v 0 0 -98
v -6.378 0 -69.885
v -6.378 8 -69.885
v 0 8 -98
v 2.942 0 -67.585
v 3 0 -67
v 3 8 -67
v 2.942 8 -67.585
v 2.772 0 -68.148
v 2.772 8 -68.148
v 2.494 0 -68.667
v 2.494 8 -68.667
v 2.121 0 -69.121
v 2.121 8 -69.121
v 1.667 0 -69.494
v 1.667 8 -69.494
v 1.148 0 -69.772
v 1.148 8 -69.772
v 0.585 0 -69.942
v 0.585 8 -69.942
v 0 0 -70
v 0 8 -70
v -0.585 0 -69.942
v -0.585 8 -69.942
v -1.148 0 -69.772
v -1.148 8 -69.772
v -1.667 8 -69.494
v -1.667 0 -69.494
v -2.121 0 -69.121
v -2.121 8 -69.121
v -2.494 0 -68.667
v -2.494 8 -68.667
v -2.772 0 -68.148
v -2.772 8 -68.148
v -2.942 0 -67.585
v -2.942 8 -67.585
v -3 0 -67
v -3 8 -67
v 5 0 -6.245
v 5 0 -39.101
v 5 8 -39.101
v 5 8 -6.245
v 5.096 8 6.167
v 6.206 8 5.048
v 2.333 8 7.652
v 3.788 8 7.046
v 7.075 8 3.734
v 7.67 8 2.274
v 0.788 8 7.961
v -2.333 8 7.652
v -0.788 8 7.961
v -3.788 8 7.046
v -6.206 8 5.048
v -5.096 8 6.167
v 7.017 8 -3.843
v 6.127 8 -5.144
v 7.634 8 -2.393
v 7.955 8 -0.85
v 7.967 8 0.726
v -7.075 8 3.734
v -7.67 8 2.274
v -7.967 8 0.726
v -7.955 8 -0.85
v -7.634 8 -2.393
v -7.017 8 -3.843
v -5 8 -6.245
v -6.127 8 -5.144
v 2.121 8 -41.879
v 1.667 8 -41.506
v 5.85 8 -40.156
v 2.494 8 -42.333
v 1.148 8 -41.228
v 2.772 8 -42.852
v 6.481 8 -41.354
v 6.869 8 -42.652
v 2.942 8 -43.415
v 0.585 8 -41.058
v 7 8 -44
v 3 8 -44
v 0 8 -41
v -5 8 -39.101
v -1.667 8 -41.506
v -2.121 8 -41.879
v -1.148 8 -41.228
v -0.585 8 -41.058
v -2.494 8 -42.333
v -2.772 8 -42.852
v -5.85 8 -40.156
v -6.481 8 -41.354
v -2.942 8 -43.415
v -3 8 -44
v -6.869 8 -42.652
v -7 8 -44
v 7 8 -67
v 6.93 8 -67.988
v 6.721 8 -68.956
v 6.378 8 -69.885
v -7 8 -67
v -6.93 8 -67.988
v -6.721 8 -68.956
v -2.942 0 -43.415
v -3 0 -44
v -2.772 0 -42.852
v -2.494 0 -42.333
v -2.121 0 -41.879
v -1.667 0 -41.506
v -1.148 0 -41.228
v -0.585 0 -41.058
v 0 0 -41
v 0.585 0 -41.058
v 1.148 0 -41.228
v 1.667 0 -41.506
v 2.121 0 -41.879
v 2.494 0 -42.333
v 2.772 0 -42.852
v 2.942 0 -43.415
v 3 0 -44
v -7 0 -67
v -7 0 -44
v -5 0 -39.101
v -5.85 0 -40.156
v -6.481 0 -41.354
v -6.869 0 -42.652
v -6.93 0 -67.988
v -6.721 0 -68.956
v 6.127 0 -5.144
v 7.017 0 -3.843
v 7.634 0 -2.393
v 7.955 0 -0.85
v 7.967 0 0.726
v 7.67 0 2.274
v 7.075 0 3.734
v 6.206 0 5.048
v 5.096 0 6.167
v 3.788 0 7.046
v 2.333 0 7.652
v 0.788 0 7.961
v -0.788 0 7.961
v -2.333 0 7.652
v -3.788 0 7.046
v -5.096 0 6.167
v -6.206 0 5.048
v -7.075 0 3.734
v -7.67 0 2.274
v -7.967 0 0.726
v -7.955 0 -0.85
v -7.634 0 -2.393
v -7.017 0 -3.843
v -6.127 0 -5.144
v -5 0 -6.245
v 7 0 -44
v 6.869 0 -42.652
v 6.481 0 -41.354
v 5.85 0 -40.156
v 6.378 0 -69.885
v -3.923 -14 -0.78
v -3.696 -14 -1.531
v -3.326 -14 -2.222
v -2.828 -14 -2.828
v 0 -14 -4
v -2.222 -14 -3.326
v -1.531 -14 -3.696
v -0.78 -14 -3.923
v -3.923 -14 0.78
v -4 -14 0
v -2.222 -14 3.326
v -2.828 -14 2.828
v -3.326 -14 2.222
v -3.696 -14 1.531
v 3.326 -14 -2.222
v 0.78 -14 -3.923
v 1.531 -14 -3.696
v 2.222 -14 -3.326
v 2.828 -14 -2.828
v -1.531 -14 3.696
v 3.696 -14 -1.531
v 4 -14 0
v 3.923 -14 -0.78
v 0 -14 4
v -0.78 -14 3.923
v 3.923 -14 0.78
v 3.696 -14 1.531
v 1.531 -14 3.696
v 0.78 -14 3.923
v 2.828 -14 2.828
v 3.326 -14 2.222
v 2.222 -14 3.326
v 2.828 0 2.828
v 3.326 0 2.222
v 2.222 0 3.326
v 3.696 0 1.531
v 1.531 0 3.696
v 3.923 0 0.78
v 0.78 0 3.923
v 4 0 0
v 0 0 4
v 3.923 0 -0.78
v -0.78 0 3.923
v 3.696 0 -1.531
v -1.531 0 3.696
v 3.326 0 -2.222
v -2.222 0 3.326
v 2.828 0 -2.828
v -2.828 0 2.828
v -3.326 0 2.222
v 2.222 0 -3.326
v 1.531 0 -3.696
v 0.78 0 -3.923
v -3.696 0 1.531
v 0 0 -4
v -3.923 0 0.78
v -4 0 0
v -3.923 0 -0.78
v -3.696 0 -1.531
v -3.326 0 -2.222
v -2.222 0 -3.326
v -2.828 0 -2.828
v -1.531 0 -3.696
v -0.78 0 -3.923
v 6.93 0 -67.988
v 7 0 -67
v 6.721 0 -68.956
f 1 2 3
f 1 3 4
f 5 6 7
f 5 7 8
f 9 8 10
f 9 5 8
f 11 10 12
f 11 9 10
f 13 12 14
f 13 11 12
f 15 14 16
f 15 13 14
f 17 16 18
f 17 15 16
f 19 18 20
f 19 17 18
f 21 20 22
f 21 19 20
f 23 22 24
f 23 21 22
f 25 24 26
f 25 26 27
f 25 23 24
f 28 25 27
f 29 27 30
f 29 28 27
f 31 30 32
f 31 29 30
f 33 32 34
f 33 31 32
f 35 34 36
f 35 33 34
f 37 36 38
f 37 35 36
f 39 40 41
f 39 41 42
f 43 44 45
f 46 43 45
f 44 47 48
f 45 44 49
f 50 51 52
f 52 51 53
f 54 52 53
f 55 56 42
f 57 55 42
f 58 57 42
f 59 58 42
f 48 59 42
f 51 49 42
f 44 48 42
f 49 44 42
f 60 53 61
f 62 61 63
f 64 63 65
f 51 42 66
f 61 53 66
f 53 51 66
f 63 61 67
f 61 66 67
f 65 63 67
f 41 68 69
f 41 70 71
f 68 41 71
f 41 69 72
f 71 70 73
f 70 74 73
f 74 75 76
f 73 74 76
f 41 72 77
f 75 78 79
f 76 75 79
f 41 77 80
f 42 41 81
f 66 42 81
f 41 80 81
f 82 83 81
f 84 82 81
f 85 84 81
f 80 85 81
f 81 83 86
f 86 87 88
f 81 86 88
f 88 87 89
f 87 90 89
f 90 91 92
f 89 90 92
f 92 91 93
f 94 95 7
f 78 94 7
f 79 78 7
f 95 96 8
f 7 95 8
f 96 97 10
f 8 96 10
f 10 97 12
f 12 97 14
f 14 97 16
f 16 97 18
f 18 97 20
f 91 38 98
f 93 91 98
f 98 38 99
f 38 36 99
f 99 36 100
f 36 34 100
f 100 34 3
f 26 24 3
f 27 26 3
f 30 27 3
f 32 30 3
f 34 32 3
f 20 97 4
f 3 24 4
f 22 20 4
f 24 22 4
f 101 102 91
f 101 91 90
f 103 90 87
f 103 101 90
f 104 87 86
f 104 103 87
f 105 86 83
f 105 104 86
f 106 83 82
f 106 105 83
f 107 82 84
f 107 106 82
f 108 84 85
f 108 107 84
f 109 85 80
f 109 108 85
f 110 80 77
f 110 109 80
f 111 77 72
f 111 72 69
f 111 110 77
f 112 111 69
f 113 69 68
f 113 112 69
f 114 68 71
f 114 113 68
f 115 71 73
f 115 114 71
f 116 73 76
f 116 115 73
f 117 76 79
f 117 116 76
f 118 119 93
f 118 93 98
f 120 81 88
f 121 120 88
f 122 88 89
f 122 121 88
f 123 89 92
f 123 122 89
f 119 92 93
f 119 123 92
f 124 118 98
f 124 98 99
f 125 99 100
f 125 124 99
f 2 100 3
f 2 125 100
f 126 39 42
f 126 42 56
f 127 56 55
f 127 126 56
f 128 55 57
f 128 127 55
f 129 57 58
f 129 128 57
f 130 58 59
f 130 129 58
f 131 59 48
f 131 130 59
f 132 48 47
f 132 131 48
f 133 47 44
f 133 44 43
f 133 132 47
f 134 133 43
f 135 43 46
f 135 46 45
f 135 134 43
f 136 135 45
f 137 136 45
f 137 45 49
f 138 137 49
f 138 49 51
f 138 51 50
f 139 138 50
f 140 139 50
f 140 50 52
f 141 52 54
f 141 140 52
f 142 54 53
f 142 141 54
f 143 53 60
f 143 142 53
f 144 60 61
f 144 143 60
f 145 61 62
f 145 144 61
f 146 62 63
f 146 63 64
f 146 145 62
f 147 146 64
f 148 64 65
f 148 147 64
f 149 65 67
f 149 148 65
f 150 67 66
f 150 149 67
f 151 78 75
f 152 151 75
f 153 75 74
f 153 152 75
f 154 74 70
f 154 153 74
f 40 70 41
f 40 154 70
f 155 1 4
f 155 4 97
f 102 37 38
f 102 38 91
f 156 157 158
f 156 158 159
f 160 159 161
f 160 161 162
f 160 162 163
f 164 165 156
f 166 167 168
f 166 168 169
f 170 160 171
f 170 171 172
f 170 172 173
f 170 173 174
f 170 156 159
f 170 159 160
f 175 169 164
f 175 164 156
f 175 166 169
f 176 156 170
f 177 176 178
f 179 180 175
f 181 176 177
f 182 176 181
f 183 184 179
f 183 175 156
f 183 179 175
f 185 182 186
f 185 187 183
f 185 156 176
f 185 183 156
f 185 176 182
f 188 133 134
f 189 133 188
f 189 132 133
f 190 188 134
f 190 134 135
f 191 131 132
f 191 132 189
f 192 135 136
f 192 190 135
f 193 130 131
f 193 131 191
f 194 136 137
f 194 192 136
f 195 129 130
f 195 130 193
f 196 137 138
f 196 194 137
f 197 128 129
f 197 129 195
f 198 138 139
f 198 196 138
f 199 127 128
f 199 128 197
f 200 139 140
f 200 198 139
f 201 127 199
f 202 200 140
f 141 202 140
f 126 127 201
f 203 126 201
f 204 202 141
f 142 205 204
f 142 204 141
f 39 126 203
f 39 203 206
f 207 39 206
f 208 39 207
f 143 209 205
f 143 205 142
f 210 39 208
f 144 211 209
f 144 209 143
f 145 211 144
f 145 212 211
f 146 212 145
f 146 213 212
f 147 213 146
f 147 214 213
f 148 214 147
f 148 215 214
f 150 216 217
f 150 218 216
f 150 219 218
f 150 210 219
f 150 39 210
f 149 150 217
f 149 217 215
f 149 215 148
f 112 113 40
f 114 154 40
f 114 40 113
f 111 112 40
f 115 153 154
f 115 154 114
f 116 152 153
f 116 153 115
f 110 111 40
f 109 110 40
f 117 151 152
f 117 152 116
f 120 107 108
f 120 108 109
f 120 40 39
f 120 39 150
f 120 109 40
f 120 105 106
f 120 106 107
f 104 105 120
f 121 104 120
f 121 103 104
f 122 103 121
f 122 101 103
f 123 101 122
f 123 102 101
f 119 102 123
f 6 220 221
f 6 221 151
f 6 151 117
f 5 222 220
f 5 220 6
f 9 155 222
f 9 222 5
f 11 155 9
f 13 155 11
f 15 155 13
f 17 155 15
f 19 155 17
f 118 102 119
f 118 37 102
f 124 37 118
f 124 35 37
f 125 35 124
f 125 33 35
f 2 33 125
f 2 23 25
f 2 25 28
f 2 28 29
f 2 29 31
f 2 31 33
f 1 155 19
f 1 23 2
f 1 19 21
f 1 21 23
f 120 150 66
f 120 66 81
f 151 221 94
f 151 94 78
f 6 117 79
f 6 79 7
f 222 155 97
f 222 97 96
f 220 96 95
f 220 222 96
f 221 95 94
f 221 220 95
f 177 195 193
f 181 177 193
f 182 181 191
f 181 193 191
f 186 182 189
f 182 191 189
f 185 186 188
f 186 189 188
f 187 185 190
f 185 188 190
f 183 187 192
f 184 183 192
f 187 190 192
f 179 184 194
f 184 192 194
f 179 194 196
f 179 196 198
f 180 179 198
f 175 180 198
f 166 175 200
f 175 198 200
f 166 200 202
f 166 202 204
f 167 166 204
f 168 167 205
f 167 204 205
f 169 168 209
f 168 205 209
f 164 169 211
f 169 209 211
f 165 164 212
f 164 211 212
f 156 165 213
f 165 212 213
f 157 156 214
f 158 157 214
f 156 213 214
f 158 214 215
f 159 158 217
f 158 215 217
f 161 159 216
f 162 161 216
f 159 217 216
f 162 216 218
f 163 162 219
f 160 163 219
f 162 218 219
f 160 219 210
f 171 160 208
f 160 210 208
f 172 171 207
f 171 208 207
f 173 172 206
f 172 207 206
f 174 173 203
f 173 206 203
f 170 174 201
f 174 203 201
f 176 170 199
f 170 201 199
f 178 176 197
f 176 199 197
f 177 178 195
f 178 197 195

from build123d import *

# Parameters (mm, degrees)
BOSS_EXTRUDE1_DEPTH = 8
SKETCH3_R           = 4
BOSS_EXTRUDE2_DEPTH = 14


with BuildPart() as part:
    # Sketch2 → Boss-Extrude1 (new body)
    with BuildSketch(Plane(origin=(0, 0, 0), x_dir=(1, 0, 0), z_dir=(0, 1, 0))):
        with BuildLine():
            Line((-5, 6.244997998), (-5, 39.101020514))
            ThreePointArc((-5, 39.101020514), (-6.480740698, 41.354248689), (-7, 44))
            Line((-7, 44), (-7, 67))
            ThreePointArc((-7, 67), (-6.84274311, 68.475420866), (-6.378038076, 69.884550276))
            Line((-6.378038076, 69.884550276), (0, 98))
            Line((0, 98), (6.378038076, 69.884550276))
            ThreePointArc((6.378038076, 69.884550276), (6.84274311, 68.475420866), (7, 67))
            Line((7, 67), (7, 44))
            ThreePointArc((7, 44), (6.480740698, 41.354248689), (5, 39.101020514))
            Line((5, 39.101020514), (5, 6.244997998))
            ThreePointArc((5, 6.244997998), (0, -8), (-5, 6.244997998))
        make_face()
        with BuildLine():
            Line((-3, 67), (-3, 44))
            ThreePointArc((-3, 44), (0, 41), (3, 44))
            Line((3, 44), (3, 67))
            ThreePointArc((3, 67), (0, 70), (-3, 67))
        make_face(mode=Mode.SUBTRACT)
    extrude(amount=BOSS_EXTRUDE1_DEPTH)

    # Sketch3 → Boss-Extrude2 (add)
    with BuildSketch(Plane.XZ):
        Circle(SKETCH3_R)
    extrude(amount=BOSS_EXTRUDE2_DEPTH)


solid = part.part
